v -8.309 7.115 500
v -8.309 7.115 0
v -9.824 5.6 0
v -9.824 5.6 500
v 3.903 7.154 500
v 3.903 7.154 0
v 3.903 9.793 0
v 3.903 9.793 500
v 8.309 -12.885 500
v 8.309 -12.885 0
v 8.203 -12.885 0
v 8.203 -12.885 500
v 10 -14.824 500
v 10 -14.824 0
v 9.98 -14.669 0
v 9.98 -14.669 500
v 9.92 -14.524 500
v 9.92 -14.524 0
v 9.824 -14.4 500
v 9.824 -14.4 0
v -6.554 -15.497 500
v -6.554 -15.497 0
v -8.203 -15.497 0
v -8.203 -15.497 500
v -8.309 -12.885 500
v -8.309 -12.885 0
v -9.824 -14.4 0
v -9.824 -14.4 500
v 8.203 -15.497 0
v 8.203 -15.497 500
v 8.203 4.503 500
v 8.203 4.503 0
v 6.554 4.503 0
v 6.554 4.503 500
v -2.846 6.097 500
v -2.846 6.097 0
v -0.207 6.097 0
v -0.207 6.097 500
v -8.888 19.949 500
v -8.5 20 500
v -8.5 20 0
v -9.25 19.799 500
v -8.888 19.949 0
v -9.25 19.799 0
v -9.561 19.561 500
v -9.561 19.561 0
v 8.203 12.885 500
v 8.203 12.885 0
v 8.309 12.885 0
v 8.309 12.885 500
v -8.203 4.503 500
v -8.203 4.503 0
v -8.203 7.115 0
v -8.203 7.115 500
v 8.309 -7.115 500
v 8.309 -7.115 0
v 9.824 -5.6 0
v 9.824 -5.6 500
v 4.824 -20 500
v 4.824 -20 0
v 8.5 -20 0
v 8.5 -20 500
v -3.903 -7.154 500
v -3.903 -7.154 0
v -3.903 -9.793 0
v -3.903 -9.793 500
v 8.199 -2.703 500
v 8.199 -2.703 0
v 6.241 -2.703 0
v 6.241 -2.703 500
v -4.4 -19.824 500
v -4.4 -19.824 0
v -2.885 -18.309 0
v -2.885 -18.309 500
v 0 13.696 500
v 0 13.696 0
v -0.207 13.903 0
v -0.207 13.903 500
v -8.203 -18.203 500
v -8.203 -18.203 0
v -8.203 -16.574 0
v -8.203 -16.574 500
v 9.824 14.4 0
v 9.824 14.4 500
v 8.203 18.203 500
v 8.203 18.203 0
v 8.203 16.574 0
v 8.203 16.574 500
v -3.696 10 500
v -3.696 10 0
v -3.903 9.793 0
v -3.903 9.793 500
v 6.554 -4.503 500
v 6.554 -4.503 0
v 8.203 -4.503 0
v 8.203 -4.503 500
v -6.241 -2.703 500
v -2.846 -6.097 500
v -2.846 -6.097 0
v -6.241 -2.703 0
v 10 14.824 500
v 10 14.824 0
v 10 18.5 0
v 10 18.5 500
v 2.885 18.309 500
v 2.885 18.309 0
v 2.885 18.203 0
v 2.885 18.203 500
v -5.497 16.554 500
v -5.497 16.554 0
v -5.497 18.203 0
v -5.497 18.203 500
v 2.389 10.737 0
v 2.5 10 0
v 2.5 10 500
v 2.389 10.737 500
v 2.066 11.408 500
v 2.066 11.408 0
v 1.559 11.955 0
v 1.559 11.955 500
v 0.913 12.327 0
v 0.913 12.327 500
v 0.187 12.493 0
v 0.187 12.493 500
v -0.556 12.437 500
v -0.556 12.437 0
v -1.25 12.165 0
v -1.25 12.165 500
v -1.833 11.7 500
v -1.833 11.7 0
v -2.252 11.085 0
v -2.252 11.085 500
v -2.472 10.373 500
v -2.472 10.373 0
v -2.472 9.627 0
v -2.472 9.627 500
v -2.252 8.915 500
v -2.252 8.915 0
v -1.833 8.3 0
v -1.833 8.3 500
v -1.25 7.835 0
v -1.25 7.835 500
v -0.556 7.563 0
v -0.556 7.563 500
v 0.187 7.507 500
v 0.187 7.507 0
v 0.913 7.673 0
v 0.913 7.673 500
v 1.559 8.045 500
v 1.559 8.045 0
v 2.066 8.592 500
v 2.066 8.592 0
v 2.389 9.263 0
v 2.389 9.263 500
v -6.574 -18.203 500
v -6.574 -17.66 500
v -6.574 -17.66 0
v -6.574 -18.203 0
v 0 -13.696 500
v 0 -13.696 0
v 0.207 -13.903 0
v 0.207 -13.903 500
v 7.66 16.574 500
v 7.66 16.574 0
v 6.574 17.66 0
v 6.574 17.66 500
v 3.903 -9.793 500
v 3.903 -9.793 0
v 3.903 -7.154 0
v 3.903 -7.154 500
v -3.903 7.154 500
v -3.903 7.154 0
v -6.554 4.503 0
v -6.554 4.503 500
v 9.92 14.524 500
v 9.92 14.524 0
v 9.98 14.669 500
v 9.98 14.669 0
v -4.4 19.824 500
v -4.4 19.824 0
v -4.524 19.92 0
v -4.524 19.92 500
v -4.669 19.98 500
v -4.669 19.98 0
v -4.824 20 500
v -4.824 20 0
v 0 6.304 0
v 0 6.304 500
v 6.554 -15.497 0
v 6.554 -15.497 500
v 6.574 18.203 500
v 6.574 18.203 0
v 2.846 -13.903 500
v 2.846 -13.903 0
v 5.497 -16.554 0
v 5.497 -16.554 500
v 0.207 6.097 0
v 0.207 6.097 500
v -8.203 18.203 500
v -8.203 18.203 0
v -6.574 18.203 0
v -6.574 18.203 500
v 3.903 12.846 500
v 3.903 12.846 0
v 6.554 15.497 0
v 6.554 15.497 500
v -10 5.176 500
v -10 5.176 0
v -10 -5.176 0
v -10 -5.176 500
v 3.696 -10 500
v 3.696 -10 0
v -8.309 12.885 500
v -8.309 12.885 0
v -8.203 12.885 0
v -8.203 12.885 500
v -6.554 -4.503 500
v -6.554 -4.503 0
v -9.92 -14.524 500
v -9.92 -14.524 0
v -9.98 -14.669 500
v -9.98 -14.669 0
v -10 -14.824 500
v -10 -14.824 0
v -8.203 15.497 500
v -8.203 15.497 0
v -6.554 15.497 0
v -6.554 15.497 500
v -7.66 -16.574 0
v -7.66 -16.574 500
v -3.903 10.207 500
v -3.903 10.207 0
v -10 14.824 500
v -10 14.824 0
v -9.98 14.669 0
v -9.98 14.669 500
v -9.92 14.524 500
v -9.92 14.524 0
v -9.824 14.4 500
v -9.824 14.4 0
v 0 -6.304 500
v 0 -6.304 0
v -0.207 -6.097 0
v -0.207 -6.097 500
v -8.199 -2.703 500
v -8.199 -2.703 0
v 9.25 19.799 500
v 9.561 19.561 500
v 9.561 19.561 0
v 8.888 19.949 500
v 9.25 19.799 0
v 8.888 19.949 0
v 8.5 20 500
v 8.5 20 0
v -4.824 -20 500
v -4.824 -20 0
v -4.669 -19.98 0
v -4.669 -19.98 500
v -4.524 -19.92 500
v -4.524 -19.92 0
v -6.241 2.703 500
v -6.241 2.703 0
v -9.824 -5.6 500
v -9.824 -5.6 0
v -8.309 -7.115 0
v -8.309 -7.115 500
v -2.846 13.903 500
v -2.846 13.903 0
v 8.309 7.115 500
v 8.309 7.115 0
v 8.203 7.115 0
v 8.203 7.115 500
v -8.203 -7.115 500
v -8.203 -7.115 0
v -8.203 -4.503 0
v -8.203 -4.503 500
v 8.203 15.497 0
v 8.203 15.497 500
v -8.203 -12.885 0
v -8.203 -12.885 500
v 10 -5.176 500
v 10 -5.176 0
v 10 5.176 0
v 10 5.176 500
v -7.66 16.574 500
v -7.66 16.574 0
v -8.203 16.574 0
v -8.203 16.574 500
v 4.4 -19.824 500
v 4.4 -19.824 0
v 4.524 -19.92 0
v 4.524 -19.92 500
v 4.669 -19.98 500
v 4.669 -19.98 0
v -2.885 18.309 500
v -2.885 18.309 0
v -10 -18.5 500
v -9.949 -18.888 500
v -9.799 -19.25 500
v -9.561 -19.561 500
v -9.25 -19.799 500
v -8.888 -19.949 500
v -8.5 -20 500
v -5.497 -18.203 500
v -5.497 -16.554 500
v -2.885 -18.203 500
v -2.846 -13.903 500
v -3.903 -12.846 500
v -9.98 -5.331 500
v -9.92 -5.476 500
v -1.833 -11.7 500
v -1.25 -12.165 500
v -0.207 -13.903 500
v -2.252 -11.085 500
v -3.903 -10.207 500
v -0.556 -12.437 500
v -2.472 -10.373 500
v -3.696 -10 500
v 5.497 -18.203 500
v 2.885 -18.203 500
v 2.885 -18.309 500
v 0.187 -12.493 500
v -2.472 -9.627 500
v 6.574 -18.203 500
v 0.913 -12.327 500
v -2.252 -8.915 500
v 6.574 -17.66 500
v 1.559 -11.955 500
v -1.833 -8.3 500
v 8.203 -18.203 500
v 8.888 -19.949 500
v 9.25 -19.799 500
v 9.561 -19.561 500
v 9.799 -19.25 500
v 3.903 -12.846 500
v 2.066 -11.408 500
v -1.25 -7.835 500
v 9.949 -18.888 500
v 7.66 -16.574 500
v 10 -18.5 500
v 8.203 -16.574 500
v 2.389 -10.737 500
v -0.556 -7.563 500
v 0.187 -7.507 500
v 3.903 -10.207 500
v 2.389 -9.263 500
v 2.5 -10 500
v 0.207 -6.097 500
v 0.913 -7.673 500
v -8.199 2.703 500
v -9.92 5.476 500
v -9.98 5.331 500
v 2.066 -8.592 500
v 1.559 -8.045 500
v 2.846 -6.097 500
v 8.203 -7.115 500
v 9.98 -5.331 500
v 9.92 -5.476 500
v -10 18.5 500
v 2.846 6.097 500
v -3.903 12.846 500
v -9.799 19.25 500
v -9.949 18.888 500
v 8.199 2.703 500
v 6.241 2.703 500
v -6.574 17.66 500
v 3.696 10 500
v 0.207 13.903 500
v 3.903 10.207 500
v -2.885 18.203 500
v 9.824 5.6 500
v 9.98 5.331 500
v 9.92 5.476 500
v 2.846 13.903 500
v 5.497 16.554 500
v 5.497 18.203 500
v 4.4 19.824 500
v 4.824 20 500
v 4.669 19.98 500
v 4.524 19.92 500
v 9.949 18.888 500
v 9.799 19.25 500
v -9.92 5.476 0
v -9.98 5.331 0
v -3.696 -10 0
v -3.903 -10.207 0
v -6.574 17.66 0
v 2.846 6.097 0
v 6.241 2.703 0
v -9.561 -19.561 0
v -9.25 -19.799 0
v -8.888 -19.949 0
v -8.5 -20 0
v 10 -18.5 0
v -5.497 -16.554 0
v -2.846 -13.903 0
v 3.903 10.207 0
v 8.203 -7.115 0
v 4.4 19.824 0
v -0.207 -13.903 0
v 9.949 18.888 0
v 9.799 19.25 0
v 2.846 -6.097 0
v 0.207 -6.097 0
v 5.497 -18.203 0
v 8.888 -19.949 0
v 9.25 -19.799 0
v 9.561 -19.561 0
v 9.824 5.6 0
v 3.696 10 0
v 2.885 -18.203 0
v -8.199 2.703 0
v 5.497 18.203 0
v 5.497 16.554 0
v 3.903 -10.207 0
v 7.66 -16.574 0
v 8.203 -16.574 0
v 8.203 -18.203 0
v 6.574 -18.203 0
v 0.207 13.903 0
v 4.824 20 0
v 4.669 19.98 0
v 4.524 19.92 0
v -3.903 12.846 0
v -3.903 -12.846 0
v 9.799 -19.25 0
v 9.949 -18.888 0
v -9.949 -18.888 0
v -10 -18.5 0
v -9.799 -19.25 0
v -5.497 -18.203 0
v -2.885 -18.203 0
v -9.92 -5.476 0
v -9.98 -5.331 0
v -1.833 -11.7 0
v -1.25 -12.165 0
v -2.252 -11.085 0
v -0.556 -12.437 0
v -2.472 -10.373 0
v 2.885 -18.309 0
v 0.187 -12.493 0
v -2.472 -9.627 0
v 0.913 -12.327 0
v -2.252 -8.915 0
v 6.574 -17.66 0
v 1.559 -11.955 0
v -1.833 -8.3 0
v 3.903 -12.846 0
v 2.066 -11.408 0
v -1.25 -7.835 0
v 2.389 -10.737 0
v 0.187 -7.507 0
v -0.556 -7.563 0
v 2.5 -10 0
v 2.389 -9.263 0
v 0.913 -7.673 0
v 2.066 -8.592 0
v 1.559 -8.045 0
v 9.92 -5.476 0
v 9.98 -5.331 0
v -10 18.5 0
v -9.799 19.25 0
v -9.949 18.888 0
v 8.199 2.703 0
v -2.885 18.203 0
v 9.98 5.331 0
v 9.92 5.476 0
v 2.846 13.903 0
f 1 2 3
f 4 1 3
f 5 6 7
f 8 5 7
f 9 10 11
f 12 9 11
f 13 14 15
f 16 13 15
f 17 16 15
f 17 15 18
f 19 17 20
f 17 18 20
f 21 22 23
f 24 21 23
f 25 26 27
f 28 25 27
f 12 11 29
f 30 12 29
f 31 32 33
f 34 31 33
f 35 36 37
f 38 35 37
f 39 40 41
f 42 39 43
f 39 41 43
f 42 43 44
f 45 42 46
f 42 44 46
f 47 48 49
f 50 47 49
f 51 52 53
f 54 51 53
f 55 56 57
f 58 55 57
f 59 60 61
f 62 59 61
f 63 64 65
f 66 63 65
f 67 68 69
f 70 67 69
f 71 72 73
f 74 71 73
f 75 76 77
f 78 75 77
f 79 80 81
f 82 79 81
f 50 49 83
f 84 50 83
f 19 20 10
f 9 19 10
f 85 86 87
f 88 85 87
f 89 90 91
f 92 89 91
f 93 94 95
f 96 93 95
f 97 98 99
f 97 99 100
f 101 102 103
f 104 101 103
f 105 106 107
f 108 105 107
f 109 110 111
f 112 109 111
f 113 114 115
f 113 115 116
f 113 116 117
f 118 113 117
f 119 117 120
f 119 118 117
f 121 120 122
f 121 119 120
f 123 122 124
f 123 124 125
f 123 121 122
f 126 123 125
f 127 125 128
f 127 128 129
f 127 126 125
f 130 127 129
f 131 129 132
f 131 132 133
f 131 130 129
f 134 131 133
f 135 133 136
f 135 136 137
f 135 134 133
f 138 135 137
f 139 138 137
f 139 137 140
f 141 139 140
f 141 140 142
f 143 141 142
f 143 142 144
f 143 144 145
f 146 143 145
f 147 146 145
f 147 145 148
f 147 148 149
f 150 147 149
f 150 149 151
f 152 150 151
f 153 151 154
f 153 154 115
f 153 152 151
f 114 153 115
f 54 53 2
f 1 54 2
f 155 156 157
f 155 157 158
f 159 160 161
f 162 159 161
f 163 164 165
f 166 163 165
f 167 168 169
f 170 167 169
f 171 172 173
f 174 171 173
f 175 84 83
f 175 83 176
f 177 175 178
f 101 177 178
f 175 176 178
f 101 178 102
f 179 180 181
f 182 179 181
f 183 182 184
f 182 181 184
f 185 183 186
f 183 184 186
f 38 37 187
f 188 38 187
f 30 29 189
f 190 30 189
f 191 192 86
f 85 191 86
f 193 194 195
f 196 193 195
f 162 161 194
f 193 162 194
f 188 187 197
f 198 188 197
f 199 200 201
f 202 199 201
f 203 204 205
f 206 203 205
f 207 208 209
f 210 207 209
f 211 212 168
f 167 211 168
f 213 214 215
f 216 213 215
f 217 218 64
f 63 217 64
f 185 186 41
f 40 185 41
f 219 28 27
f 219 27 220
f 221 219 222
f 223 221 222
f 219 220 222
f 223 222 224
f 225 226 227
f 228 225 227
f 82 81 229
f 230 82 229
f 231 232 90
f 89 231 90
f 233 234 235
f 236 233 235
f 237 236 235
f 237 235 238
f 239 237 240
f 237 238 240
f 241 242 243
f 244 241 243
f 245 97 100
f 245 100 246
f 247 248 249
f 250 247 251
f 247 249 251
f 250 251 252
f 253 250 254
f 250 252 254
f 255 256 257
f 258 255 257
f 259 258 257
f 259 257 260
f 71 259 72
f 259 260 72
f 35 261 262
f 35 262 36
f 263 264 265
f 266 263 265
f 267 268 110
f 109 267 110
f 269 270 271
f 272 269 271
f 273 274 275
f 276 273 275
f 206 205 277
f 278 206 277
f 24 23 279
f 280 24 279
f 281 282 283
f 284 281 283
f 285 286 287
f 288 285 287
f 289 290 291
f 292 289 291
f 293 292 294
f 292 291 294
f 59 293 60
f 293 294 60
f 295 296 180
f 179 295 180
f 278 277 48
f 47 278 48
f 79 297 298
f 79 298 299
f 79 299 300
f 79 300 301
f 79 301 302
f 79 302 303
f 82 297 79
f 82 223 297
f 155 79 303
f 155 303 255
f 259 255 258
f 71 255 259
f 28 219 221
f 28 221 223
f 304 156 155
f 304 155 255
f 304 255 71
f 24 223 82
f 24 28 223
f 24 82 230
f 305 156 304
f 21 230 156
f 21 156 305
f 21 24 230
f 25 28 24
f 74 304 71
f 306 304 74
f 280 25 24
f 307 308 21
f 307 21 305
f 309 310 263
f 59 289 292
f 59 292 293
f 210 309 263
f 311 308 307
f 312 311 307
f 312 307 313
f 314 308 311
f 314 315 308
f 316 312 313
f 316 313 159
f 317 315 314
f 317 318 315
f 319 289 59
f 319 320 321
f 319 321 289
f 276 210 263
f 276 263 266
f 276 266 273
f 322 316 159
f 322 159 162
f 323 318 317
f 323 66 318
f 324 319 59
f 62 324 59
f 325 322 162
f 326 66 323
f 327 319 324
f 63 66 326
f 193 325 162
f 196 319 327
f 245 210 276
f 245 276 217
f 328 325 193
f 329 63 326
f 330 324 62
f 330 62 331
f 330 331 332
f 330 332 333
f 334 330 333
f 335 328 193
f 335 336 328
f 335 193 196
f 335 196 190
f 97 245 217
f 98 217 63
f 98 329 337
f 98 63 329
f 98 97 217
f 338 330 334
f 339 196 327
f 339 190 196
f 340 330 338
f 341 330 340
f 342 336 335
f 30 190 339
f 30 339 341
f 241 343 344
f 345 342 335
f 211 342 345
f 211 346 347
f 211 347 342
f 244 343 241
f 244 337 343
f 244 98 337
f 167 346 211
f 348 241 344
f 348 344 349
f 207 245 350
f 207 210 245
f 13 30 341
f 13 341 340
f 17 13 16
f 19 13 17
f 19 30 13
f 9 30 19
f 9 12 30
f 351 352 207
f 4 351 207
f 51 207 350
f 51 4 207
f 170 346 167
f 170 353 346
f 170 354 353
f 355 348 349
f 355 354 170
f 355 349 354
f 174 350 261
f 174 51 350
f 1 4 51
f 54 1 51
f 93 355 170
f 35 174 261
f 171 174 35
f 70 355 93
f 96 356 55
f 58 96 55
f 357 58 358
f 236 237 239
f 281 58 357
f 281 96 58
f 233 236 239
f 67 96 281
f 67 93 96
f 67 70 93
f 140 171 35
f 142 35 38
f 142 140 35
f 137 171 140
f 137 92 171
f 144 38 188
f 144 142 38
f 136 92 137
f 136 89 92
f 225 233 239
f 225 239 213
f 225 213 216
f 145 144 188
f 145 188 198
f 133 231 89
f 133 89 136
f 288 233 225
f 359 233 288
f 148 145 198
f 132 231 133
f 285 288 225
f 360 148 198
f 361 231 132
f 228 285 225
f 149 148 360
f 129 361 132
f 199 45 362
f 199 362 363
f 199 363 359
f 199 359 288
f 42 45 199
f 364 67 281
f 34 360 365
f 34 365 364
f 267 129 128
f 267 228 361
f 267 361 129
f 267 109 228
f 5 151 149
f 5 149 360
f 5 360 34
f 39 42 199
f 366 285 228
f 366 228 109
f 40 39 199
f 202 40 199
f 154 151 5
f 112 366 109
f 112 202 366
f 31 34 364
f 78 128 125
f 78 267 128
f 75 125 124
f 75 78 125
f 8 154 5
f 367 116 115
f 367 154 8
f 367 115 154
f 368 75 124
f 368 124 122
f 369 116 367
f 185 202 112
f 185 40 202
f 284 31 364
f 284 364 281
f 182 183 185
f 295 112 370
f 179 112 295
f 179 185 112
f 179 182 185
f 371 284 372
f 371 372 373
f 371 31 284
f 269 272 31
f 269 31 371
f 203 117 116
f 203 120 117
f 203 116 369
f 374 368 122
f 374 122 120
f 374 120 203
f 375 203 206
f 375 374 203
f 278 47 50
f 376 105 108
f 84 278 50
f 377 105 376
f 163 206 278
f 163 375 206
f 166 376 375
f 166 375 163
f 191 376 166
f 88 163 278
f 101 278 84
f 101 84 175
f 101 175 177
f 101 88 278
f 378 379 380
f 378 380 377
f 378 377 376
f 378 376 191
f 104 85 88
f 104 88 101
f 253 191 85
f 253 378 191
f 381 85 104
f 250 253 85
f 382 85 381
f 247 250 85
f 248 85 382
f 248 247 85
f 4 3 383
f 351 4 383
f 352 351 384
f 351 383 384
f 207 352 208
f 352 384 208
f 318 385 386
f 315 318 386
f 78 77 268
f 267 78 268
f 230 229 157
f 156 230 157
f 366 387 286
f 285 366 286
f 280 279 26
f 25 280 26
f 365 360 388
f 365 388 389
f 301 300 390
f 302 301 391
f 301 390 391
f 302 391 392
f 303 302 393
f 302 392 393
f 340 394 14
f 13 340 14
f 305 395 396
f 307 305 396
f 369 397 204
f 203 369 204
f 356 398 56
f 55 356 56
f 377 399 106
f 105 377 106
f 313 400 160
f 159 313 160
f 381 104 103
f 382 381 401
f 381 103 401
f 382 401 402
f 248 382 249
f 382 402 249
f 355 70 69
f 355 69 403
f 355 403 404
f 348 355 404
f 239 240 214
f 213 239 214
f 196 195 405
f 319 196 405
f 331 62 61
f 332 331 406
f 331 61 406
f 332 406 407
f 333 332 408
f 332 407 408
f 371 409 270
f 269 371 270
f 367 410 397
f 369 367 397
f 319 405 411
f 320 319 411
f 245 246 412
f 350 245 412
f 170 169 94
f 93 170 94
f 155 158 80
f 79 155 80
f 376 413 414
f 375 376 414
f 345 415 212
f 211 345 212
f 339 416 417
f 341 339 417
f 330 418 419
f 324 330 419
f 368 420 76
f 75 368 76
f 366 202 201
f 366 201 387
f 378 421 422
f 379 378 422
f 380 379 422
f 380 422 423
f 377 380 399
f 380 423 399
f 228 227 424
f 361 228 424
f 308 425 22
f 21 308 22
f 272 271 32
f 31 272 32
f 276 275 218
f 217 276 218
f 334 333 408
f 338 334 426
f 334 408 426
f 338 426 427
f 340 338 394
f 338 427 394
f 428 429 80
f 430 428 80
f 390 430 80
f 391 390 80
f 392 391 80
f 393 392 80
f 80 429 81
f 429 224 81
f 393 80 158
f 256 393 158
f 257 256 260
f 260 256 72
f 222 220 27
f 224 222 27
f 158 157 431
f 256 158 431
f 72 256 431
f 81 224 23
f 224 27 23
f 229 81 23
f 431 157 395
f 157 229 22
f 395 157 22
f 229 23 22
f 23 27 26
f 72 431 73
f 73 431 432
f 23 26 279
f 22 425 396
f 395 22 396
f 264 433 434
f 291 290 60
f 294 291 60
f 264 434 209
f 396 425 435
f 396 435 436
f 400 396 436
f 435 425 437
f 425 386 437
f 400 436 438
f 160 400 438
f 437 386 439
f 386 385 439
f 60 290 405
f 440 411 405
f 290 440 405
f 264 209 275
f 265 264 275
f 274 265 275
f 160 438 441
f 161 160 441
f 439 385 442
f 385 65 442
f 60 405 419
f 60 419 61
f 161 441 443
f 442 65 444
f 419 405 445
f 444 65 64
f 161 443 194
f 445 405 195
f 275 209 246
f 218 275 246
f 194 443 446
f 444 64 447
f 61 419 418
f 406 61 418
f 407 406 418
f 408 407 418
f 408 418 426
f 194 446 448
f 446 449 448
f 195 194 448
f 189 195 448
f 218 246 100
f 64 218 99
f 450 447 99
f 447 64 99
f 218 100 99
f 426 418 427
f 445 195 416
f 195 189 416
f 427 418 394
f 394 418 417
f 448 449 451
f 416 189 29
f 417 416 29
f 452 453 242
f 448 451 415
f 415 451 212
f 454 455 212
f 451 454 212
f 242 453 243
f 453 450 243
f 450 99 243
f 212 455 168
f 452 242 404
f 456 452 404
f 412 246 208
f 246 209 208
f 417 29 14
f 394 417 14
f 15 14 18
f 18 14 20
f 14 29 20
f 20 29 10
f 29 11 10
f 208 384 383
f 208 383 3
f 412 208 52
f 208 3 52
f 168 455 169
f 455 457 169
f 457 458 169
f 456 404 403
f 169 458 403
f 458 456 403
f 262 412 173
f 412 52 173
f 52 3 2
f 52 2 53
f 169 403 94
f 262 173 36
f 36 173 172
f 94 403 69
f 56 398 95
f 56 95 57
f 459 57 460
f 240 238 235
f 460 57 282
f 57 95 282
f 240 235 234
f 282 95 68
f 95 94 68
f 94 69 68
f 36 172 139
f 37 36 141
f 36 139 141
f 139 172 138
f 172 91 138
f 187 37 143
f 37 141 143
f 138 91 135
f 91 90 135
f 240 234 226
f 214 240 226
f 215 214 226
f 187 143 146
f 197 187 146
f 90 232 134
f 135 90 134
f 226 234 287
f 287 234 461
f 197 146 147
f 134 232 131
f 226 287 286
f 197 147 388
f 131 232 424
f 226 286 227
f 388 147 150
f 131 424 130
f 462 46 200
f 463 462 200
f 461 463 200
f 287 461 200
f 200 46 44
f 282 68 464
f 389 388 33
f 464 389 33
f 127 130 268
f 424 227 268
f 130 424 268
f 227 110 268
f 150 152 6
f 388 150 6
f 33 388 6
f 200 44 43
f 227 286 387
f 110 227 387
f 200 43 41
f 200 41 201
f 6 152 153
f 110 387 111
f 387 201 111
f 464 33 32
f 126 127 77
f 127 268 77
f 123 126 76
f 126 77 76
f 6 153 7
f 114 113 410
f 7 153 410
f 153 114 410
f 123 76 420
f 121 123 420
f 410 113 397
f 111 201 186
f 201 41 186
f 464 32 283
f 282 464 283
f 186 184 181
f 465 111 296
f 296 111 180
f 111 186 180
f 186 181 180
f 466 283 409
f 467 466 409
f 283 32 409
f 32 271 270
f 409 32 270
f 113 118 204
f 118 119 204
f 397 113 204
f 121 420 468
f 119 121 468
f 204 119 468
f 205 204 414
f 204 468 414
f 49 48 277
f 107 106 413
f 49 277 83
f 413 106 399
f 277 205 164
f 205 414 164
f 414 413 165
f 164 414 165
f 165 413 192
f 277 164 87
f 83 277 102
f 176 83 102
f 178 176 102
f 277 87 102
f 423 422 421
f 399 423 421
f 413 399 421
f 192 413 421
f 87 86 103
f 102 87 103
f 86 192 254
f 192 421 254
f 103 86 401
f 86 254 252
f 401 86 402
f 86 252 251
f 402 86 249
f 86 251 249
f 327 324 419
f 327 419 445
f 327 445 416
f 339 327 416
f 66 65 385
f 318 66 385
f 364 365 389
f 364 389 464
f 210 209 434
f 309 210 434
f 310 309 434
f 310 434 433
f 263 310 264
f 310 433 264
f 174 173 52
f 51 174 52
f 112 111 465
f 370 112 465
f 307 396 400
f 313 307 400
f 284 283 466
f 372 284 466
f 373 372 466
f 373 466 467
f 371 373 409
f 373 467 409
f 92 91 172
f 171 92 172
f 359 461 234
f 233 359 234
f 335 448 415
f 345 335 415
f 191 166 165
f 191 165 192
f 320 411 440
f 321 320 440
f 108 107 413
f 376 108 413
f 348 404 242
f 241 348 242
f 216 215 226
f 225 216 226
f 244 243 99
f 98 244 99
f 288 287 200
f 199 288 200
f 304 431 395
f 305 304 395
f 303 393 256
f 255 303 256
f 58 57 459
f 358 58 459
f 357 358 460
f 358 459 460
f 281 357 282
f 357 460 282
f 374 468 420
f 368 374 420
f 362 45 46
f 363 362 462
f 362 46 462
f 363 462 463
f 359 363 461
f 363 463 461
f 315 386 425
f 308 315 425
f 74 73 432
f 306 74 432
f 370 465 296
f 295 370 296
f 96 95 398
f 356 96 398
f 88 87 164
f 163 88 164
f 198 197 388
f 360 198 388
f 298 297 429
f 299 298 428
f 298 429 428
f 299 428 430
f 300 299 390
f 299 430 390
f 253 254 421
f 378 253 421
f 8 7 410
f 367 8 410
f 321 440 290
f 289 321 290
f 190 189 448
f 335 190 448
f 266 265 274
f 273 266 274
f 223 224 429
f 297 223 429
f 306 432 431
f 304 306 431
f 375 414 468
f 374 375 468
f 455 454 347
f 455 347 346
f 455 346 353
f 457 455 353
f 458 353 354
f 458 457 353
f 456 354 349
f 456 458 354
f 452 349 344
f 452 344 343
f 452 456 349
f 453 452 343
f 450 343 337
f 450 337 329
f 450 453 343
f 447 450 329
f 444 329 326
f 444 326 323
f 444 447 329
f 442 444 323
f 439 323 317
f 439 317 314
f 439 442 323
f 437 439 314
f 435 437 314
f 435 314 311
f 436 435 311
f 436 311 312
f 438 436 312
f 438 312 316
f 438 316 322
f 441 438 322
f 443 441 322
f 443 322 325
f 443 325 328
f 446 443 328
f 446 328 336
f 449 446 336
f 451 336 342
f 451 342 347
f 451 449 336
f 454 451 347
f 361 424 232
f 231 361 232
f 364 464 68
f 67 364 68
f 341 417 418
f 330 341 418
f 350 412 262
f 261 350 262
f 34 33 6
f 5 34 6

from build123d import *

# Parameters (mm, degrees)
F0_R     = 2.5
F1_DEPTH = 500


with BuildPart() as f1:
    # F0 (on Top) → F1 (new body)
    with BuildSketch(Plane.XY):
        with BuildLine():
            Line((-0.206975, 13.902523), (-2.845819, 13.902523))
            Line((-2.845819, 13.902523), (-5.497237, 16.55394))
            Line((-5.497237, 16.55394), (-5.497237, 18.202523))
            Line((-5.497237, 18.202523), (-2.885113, 18.202523))
            Line((-2.885113, 18.202523), (-2.885113, 18.30915))
            Line((-2.885113, 18.30915), (-4.400227, 19.824264))
            ThreePointArc((-4.400227, 19.824264), (-4.594881, 19.954328), (-4.824491, 20))
            Line((-4.824491, 20), (-8.5, 20))
            ThreePointArc((-8.5, 20), (-9.074025, 19.885819), (-9.56066, 19.56066))
            ThreePointArc((-9.56066, 19.56066), (-9.885819, 19.074025), (-10, 18.5))
            Line((-10, 18.5), (-10, 14.824491))
            ThreePointArc((-10, 14.824491), (-9.954328, 14.594881), (-9.824264, 14.400227))
            Line((-9.824264, 14.400227), (-8.30915, 12.885113))
            Line((-8.30915, 12.885113), (-8.202523, 12.885113))
            Line((-8.202523, 12.885113), (-8.202523, 15.497237))
            Line((-8.202523, 15.497237), (-6.55394, 15.497237))
            Line((-6.55394, 15.497237), (-3.902523, 12.845819))
            Line((-3.902523, 12.845819), (-3.902523, 10.206975))
            Line((-3.902523, 10.206975), (-3.695548, 10))
            Line((-3.695548, 10), (-3.902523, 9.793025))
            Line((-3.902523, 9.793025), (-3.902523, 7.154181))
            Line((-3.902523, 7.154181), (-6.55394, 4.502763))
            Line((-6.55394, 4.502763), (-8.202523, 4.502763))
            Line((-8.202523, 4.502763), (-8.202523, 7.114887))
            Line((-8.202523, 7.114887), (-8.30915, 7.114887))
            Line((-8.30915, 7.114887), (-9.824264, 5.599773))
            ThreePointArc((-9.824264, 5.599773), (-9.954328, 5.405119), (-10, 5.175509))
            Line((-10, 5.175509), (-10, 0))
            Line((-10, 0), (-10, -5.175509))
            ThreePointArc((-10, -5.175509), (-9.954328, -5.405119), (-9.824264, -5.599773))
            Line((-9.824264, -5.599773), (-8.30915, -7.114887))
            Line((-8.30915, -7.114887), (-8.202523, -7.114887))
            Line((-8.202523, -7.114887), (-8.202523, -4.502763))
            Line((-8.202523, -4.502763), (-6.55394, -4.502763))
            Line((-6.55394, -4.502763), (-3.902523, -7.154181))
            Line((-3.902523, -7.154181), (-3.902523, -9.793025))
            Line((-3.902523, -9.793025), (-3.695548, -10))
            Line((-3.695548, -10), (-3.902523, -10.206975))
            Line((-3.902523, -10.206975), (-3.902523, -12.845819))
            Line((-3.902523, -12.845819), (-6.55394, -15.497237))
            Line((-6.55394, -15.497237), (-8.202523, -15.497237))
            Line((-8.202523, -15.497237), (-8.202523, -12.885113))
            Line((-8.202523, -12.885113), (-8.30915, -12.885113))
            Line((-8.30915, -12.885113), (-9.824264, -14.400227))
            ThreePointArc((-9.824264, -14.400227), (-9.954328, -14.594881), (-10, -14.824491))
            Line((-10, -14.824491), (-10, -18.5))
            ThreePointArc((-10, -18.5), (-9.885819, -19.074025), (-9.56066, -19.56066))
            ThreePointArc((-9.56066, -19.56066), (-9.074025, -19.885819), (-8.5, -20))
            Line((-8.5, -20), (-4.824491, -20))
            ThreePointArc((-4.824491, -20), (-4.594881, -19.954328), (-4.400227, -19.824264))
            Line((-4.400227, -19.824264), (-2.885113, -18.30915))
            Line((-2.885113, -18.30915), (-2.885113, -18.202523))
            Line((-2.885113, -18.202523), (-5.497237, -18.202523))
            Line((-5.497237, -18.202523), (-5.497237, -16.55394))
            Line((-5.497237, -16.55394), (-2.845819, -13.902523))
            Line((-2.845819, -13.902523), (-0.206975, -13.902523))
            Line((-0.206975, -13.902523), (0, -13.695548))
            Line((0, -13.695548), (0.206975, -13.902523))
            Line((0.206975, -13.902523), (2.845819, -13.902523))
            Line((2.845819, -13.902523), (5.497237, -16.55394))
            Line((5.497237, -16.55394), (5.497237, -18.202523))
            Line((5.497237, -18.202523), (2.885113, -18.202523))
            Line((2.885113, -18.202523), (2.885113, -18.30915))
            Line((2.885113, -18.30915), (4.400227, -19.824264))
            ThreePointArc((4.400227, -19.824264), (4.594881, -19.954328), (4.824491, -20))
            Line((4.824491, -20), (8.5, -20))
            ThreePointArc((8.5, -20), (9.074025, -19.885819), (9.56066, -19.56066))
            ThreePointArc((9.56066, -19.56066), (9.885819, -19.074025), (10, -18.5))
            Line((10, -18.5), (10, -14.824491))
            ThreePointArc((10, -14.824491), (9.954328, -14.594881), (9.824264, -14.400227))
            Line((9.824264, -14.400227), (8.30915, -12.885113))
            Line((8.30915, -12.885113), (8.202523, -12.885113))
            Line((8.202523, -12.885113), (8.202523, -15.497237))
            Line((8.202523, -15.497237), (6.55394, -15.497237))
            Line((6.55394, -15.497237), (3.902523, -12.845819))
            Line((3.902523, -12.845819), (3.902523, -10.206975))
            Line((3.902523, -10.206975), (3.695548, -10))
            Line((3.695548, -10), (3.902523, -9.793025))
            Line((3.902523, -9.793025), (3.902523, -7.154181))
            Line((3.902523, -7.154181), (6.55394, -4.502763))
            Line((6.55394, -4.502763), (8.202523, -4.502763))
            Line((8.202523, -4.502763), (8.202523, -7.114887))
            Line((8.202523, -7.114887), (8.30915, -7.114887))
            Line((8.30915, -7.114887), (9.824264, -5.599773))
            ThreePointArc((9.824264, -5.599773), (9.954328, -5.405119), (10, -5.175509))
            Line((10, -5.175509), (10, 0))
            Line((10, 0), (10, 5.175509))
            ThreePointArc((10, 5.175509), (9.954328, 5.405119), (9.824264, 5.599773))
            Line((9.824264, 5.599773), (8.30915, 7.114887))
            Line((8.30915, 7.114887), (8.202523, 7.114887))
            Line((8.202523, 7.114887), (8.202523, 4.502763))
            Line((8.202523, 4.502763), (6.55394, 4.502763))
            Line((6.55394, 4.502763), (3.902523, 7.154181))
            Line((3.902523, 7.154181), (3.902523, 9.793025))
            Line((3.902523, 9.793025), (3.695548, 10))
            Line((3.695548, 10), (3.902523, 10.206975))
            Line((3.902523, 10.206975), (3.902523, 12.845819))
            Line((3.902523, 12.845819), (6.55394, 15.497237))
            Line((6.55394, 15.497237), (8.202523, 15.497237))
            Line((8.202523, 15.497237), (8.202523, 12.885113))
            Line((8.202523, 12.885113), (8.30915, 12.885113))
            Line((8.30915, 12.885113), (9.824264, 14.400227))
            ThreePointArc((9.824264, 14.400227), (9.954328, 14.594881), (10, 14.824491))
            Line((10, 14.824491), (10, 18.5))
            ThreePointArc((10, 18.5), (9.885819, 19.074025), (9.56066, 19.56066))
            ThreePointArc((9.56066, 19.56066), (9.074025, 19.885819), (8.5, 20))
            Line((8.5, 20), (4.824491, 20))
            ThreePointArc((4.824491, 20), (4.594881, 19.954328), (4.400227, 19.824264))
            Line((4.400227, 19.824264), (2.885113, 18.30915))
            Line((2.885113, 18.30915), (2.885113, 18.202523))
            Line((2.885113, 18.202523), (5.497237, 18.202523))
            Line((5.497237, 18.202523), (5.497237, 16.55394))
            Line((5.497237, 16.55394), (2.845819, 13.902523))
            Line((2.845819, 13.902523), (0.206975, 13.902523))
            Line((0.206975, 13.902523), (0, 13.695548))
            Line((0, 13.695548), (-0.206975, 13.902523))
        make_face()
        Polygon((-7.11684, -17.11684), (-6.573574, -17.660106), (-6.573574, -18.202523), (-8.202523, -18.202523), (-8.202523, -16.573574), (-7.660106, -16.573574), align=None, mode=Mode.SUBTRACT)
        Polygon((7.11684, -17.11684), (7.660106, -16.573574), (8.202523, -16.573574), (8.202523, -18.202523), (6.573574, -18.202523), (6.573574, -17.660106), align=None, mode=Mode.SUBTRACT)
        with Locations((0, -10)):
            Circle(F0_R, mode=Mode.SUBTRACT)
        Polygon((-6.573574, 18.202523), (-6.573574, 17.660106), (-7.11684, 17.11684), (-7.660106, 16.573574), (-8.202523, 16.573574), (-8.202523, 18.202523), align=None, mode=Mode.SUBTRACT)
        Polygon((0.206975, 6.097477), (2.845819, 6.097477), (6.240773, 2.702523), (8.199174, 2.702523), (8.199174, 0), (8.199174, -2.702523), (6.240773, -2.702523), (2.845819, -6.097477), (0.206975, -6.097477), (0, -6.304452), (-0.206975, -6.097477), (-2.845819, -6.097477), (-6.240773, -2.702523), (-8.199174, -2.702523), (-8.199174, 0), (-8.199174, 2.702523), (-6.240773, 2.702523), (-2.845819, 6.097477), (-0.206975, 6.097477), (0, 6.304452), align=None, mode=Mode.SUBTRACT)
        with Locations((0, 10)):
            Circle(F0_R, mode=Mode.SUBTRACT)
        Polygon((7.11684, 17.11684), (6.573574, 17.660106), (6.573574, 18.202523), (8.202523, 18.202523), (8.202523, 16.573574), (7.660106, 16.573574), align=None, mode=Mode.SUBTRACT)
    extrude(amount=F1_DEPTH)


solid = f1.part
